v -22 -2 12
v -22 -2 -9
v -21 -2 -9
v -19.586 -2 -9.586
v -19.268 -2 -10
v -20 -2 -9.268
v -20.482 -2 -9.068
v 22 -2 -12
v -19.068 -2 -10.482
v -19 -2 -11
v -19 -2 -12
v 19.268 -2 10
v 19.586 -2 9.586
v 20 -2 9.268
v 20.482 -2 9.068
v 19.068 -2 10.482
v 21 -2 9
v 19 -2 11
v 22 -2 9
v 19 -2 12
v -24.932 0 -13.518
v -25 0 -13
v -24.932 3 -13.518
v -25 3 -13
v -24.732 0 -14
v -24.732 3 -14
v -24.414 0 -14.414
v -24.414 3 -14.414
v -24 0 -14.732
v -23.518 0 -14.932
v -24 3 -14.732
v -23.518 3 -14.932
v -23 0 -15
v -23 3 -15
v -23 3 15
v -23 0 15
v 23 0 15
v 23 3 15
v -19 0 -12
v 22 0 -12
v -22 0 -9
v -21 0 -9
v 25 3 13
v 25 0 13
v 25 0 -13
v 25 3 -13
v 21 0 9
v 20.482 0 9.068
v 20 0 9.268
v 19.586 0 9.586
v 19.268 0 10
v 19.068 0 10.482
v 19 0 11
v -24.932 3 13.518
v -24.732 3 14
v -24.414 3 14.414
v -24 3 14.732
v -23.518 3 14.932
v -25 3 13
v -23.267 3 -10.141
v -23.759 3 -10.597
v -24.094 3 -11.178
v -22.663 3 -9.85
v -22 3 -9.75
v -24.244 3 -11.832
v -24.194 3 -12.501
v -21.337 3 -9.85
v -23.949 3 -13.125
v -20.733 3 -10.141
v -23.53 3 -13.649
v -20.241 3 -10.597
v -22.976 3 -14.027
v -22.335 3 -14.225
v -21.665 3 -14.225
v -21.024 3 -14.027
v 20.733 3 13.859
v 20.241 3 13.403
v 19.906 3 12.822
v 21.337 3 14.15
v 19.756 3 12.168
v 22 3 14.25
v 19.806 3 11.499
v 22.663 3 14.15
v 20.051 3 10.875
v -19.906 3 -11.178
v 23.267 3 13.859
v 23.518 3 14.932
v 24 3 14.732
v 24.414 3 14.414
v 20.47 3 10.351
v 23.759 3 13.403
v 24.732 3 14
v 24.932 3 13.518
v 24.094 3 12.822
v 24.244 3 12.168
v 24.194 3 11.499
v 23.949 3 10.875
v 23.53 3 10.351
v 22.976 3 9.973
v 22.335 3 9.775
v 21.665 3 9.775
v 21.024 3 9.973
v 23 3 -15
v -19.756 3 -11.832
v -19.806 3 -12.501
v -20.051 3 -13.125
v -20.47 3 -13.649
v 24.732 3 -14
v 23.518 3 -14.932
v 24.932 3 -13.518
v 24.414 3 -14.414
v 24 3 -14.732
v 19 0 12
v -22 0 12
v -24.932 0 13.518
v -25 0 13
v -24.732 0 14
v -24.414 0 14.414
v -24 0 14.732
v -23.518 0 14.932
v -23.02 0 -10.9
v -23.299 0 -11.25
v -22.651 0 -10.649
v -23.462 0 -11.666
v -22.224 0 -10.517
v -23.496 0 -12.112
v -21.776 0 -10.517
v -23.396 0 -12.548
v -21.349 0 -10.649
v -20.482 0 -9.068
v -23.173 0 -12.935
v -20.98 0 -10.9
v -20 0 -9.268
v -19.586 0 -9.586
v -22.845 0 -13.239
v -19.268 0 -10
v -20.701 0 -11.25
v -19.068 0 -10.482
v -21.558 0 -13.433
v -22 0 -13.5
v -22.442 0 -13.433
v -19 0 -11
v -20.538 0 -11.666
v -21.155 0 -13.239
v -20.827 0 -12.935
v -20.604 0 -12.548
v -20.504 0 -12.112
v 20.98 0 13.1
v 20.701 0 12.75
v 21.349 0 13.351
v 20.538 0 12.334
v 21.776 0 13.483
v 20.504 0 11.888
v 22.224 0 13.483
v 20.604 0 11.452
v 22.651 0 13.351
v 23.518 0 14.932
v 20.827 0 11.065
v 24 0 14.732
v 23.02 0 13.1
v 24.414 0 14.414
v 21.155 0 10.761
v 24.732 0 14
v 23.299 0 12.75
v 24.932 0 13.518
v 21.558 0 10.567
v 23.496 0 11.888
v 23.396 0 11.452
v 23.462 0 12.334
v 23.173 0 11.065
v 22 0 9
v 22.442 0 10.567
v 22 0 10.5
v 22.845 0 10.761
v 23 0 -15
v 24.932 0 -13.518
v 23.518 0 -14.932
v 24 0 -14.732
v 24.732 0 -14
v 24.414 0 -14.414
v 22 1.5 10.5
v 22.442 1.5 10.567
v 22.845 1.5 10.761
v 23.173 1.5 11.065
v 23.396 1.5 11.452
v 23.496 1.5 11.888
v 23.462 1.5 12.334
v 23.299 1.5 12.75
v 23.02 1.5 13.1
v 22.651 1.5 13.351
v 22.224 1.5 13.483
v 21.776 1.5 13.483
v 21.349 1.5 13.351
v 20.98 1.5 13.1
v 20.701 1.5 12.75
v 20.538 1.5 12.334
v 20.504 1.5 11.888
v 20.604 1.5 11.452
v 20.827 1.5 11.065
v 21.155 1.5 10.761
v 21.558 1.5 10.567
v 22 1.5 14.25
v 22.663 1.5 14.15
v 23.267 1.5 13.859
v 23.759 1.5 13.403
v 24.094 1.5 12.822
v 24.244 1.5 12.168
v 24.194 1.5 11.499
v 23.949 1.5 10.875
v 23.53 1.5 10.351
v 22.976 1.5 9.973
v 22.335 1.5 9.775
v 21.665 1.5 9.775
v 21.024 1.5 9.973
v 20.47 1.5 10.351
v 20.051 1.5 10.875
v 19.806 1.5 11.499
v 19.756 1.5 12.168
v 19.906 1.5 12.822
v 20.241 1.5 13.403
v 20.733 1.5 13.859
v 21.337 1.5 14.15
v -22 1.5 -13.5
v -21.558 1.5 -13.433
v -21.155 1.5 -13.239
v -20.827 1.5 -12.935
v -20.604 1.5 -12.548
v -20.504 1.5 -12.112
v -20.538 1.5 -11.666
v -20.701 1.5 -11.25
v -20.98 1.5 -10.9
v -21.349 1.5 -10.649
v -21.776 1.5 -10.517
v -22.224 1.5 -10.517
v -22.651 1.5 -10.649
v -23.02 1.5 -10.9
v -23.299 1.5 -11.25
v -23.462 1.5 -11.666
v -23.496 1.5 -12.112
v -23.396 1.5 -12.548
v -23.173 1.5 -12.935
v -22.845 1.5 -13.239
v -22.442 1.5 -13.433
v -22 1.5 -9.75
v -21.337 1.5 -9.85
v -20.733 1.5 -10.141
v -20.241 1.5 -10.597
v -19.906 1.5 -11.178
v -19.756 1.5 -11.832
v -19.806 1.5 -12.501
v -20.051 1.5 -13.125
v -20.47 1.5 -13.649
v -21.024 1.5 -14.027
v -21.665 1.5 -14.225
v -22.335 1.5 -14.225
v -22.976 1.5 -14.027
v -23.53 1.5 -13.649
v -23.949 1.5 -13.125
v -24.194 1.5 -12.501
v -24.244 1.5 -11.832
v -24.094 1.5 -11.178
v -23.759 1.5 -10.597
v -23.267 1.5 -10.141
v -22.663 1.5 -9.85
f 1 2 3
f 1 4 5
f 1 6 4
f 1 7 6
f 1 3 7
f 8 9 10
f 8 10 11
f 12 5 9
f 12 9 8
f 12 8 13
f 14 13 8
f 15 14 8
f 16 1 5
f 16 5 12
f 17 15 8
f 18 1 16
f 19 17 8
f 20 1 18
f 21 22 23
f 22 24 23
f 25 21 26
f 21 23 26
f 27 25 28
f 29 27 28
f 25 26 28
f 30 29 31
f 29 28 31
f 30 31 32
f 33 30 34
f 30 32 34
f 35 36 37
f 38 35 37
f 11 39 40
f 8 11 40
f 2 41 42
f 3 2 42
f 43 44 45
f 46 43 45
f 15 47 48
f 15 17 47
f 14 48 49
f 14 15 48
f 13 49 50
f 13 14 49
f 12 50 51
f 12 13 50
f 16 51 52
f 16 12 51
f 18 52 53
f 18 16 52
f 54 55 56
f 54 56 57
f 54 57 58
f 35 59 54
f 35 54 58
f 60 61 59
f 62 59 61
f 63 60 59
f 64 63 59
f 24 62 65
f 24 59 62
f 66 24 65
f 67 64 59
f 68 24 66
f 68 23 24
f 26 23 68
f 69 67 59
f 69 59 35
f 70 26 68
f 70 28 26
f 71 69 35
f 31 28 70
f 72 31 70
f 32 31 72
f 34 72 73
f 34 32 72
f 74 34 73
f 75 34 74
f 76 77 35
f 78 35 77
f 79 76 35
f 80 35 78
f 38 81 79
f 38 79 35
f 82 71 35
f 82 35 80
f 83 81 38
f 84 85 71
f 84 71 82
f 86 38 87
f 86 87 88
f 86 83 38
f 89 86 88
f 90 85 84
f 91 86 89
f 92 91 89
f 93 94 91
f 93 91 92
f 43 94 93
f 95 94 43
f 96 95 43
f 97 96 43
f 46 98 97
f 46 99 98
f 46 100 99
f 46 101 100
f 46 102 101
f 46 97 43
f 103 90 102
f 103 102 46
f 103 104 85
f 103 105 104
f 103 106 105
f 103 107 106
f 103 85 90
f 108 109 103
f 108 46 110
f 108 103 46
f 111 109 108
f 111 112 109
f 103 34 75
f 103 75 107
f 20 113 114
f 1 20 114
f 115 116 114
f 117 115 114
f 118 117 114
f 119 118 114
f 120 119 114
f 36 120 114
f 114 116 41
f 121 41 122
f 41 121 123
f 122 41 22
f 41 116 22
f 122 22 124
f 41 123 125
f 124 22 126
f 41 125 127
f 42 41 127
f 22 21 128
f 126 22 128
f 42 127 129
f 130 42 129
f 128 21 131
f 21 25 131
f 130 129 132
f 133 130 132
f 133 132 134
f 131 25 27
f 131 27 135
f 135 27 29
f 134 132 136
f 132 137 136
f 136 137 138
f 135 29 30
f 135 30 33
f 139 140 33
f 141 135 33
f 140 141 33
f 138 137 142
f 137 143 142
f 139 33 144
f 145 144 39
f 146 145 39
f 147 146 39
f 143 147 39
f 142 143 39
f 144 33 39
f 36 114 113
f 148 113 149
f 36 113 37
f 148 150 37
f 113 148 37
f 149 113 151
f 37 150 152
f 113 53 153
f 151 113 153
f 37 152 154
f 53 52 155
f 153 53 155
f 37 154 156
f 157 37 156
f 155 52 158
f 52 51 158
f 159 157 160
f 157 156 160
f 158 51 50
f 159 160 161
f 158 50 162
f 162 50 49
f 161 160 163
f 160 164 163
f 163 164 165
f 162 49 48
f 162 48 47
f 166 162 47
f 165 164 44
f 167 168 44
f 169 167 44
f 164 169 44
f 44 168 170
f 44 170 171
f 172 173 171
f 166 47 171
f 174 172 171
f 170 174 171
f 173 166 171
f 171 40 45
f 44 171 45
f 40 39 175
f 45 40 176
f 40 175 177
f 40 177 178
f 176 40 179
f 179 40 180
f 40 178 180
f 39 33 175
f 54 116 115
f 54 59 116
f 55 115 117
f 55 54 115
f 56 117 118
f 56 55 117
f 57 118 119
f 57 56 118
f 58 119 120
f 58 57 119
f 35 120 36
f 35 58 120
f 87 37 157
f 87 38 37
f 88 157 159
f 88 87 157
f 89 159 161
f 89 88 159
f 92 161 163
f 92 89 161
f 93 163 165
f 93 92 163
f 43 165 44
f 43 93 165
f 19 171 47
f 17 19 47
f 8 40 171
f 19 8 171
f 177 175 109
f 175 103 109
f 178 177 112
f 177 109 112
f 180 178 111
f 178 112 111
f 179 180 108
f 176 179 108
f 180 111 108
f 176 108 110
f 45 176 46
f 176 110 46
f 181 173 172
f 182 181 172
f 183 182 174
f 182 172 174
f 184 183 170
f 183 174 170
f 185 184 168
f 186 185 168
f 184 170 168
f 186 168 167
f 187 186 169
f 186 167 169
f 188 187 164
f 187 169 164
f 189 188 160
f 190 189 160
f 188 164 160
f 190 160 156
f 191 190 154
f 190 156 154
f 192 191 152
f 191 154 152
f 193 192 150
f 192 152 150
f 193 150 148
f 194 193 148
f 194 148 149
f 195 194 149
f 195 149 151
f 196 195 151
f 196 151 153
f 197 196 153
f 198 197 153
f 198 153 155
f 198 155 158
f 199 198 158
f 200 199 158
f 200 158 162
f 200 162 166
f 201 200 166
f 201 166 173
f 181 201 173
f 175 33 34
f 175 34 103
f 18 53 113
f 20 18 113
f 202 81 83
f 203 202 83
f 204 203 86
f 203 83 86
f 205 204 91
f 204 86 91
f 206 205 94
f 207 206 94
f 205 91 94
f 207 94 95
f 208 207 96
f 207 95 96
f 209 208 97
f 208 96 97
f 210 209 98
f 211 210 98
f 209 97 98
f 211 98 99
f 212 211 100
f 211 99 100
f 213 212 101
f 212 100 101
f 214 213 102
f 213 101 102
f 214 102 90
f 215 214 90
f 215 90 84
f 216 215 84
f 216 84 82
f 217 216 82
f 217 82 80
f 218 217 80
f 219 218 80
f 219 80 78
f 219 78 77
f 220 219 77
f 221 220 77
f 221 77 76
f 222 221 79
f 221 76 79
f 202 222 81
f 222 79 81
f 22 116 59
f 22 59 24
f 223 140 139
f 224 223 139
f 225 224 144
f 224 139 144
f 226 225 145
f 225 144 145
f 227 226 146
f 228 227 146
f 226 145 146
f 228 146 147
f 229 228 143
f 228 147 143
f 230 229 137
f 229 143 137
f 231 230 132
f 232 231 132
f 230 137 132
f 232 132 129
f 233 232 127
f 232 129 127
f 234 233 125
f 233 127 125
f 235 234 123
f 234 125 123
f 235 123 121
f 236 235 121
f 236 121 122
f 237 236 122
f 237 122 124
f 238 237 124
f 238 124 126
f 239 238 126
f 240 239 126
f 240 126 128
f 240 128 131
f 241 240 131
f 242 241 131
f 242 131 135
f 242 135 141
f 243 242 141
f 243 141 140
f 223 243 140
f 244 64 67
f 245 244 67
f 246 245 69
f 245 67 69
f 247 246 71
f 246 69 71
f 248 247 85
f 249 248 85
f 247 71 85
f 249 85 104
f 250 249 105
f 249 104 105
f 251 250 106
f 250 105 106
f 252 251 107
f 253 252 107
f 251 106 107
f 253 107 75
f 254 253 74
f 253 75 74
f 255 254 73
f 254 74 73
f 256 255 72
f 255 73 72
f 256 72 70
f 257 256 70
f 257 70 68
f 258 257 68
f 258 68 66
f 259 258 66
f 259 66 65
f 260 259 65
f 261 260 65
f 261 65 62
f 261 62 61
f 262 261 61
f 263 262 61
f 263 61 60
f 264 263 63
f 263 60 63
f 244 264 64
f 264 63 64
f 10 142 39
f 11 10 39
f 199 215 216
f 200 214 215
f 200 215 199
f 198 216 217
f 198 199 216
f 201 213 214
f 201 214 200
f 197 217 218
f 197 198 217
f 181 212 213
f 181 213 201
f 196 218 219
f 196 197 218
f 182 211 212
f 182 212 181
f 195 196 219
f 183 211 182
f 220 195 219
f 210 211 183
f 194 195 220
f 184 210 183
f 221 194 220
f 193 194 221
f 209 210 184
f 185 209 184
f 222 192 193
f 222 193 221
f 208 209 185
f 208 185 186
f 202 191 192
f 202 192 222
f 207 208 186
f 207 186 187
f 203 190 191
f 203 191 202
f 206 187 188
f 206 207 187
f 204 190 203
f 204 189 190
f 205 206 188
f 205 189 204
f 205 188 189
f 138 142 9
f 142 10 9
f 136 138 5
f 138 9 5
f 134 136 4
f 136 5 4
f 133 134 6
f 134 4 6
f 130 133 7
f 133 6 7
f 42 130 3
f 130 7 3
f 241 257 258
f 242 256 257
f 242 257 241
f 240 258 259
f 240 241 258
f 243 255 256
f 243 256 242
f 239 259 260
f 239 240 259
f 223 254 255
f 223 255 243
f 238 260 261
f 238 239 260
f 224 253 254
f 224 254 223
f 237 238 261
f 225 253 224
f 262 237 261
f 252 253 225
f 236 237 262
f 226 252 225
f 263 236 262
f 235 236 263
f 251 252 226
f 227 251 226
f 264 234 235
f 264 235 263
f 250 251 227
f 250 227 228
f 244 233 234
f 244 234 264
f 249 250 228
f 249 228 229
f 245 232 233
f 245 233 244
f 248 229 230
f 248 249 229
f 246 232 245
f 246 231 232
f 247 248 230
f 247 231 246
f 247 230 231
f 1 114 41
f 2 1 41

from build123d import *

# Parameters (mm, degrees)
CROQUIS2_W              = 50
CROQUIS2_H              = 30
SALIENTE_EXTRUIR2_DEPTH = 3
SALIENTE_EXTRUIR3_DEPTH = 2
REDONDEO1_R             = 2
CROQUIS6_R              = 1.5
CORTAR_EXTRUIR2_DEPTH   = 7
REDONDEO3_R             = 2
CROQUIS7_R              = 2.25
CORTAR_EXTRUIR3_DEPTH   = 1.5


with BuildPart() as part:
    # Croquis2 → Saliente-Extruir2 (new body)
    with BuildSketch(Plane(origin=(0, 0, 0), x_dir=(1, 0, 0), z_dir=(0, 1, 0))):
        Rectangle(CROQUIS2_W, CROQUIS2_H)
    extrude(amount=SALIENTE_EXTRUIR2_DEPTH)

    # Croquis3 → Saliente-Extruir3 (add)
    with BuildSketch(Plane.XZ):
        Polygon((-19, -12), (22, -12), (22, 9), (19, 9), (19, 12), (-22, 12), (-22, -9), (-19, -9), align=None)
    extrude(amount=SALIENTE_EXTRUIR3_DEPTH)

    # Redondeo1
    redondeo1_edges = [part.edges().sort_by_distance(p)[0] for p in [
        (25, 1.5, 15),
        (-25, 1.5, 15),
        (-25, 1.5, -15),
        (25, 1.5, -15),
    ]]
    fillet(redondeo1_edges, radius=REDONDEO1_R)

    # Croquis6 → Cortar-Extruir2 (cut)
    with BuildSketch(Plane.XZ):
        with Locations(Location((-22, -12, 0), (0, 0, 270))):
            Circle(CROQUIS6_R)
        with Locations(Location((22, 12, 0), (0, 0, 270))):
            Circle(CROQUIS6_R)
    extrude(amount=-CORTAR_EXTRUIR2_DEPTH, mode=Mode.SUBTRACT)

    # Redondeo3
    redondeo3_edges = [part.edges().sort_by_distance(p)[0] for p in [
        (-19, -1, -9),
        (19, -1, 9),
    ]]
    fillet(redondeo3_edges, radius=REDONDEO3_R)

    # Croquis7 → Cortar-Extruir3 (cut)
    with BuildSketch(Plane(origin=(0, 3, 0), x_dir=(1, 0, 0), z_dir=(0, 1, 0))):
        with Locations(Location((-22, 12, 0), (0, 0, 270))):
            Circle(CROQUIS7_R)
        with Locations(Location((22, -12, 0), (0, 0, 270))):
            Circle(CROQUIS7_R)
    extrude(amount=-CORTAR_EXTRUIR3_DEPTH, mode=Mode.SUBTRACT)


solid = part.part
